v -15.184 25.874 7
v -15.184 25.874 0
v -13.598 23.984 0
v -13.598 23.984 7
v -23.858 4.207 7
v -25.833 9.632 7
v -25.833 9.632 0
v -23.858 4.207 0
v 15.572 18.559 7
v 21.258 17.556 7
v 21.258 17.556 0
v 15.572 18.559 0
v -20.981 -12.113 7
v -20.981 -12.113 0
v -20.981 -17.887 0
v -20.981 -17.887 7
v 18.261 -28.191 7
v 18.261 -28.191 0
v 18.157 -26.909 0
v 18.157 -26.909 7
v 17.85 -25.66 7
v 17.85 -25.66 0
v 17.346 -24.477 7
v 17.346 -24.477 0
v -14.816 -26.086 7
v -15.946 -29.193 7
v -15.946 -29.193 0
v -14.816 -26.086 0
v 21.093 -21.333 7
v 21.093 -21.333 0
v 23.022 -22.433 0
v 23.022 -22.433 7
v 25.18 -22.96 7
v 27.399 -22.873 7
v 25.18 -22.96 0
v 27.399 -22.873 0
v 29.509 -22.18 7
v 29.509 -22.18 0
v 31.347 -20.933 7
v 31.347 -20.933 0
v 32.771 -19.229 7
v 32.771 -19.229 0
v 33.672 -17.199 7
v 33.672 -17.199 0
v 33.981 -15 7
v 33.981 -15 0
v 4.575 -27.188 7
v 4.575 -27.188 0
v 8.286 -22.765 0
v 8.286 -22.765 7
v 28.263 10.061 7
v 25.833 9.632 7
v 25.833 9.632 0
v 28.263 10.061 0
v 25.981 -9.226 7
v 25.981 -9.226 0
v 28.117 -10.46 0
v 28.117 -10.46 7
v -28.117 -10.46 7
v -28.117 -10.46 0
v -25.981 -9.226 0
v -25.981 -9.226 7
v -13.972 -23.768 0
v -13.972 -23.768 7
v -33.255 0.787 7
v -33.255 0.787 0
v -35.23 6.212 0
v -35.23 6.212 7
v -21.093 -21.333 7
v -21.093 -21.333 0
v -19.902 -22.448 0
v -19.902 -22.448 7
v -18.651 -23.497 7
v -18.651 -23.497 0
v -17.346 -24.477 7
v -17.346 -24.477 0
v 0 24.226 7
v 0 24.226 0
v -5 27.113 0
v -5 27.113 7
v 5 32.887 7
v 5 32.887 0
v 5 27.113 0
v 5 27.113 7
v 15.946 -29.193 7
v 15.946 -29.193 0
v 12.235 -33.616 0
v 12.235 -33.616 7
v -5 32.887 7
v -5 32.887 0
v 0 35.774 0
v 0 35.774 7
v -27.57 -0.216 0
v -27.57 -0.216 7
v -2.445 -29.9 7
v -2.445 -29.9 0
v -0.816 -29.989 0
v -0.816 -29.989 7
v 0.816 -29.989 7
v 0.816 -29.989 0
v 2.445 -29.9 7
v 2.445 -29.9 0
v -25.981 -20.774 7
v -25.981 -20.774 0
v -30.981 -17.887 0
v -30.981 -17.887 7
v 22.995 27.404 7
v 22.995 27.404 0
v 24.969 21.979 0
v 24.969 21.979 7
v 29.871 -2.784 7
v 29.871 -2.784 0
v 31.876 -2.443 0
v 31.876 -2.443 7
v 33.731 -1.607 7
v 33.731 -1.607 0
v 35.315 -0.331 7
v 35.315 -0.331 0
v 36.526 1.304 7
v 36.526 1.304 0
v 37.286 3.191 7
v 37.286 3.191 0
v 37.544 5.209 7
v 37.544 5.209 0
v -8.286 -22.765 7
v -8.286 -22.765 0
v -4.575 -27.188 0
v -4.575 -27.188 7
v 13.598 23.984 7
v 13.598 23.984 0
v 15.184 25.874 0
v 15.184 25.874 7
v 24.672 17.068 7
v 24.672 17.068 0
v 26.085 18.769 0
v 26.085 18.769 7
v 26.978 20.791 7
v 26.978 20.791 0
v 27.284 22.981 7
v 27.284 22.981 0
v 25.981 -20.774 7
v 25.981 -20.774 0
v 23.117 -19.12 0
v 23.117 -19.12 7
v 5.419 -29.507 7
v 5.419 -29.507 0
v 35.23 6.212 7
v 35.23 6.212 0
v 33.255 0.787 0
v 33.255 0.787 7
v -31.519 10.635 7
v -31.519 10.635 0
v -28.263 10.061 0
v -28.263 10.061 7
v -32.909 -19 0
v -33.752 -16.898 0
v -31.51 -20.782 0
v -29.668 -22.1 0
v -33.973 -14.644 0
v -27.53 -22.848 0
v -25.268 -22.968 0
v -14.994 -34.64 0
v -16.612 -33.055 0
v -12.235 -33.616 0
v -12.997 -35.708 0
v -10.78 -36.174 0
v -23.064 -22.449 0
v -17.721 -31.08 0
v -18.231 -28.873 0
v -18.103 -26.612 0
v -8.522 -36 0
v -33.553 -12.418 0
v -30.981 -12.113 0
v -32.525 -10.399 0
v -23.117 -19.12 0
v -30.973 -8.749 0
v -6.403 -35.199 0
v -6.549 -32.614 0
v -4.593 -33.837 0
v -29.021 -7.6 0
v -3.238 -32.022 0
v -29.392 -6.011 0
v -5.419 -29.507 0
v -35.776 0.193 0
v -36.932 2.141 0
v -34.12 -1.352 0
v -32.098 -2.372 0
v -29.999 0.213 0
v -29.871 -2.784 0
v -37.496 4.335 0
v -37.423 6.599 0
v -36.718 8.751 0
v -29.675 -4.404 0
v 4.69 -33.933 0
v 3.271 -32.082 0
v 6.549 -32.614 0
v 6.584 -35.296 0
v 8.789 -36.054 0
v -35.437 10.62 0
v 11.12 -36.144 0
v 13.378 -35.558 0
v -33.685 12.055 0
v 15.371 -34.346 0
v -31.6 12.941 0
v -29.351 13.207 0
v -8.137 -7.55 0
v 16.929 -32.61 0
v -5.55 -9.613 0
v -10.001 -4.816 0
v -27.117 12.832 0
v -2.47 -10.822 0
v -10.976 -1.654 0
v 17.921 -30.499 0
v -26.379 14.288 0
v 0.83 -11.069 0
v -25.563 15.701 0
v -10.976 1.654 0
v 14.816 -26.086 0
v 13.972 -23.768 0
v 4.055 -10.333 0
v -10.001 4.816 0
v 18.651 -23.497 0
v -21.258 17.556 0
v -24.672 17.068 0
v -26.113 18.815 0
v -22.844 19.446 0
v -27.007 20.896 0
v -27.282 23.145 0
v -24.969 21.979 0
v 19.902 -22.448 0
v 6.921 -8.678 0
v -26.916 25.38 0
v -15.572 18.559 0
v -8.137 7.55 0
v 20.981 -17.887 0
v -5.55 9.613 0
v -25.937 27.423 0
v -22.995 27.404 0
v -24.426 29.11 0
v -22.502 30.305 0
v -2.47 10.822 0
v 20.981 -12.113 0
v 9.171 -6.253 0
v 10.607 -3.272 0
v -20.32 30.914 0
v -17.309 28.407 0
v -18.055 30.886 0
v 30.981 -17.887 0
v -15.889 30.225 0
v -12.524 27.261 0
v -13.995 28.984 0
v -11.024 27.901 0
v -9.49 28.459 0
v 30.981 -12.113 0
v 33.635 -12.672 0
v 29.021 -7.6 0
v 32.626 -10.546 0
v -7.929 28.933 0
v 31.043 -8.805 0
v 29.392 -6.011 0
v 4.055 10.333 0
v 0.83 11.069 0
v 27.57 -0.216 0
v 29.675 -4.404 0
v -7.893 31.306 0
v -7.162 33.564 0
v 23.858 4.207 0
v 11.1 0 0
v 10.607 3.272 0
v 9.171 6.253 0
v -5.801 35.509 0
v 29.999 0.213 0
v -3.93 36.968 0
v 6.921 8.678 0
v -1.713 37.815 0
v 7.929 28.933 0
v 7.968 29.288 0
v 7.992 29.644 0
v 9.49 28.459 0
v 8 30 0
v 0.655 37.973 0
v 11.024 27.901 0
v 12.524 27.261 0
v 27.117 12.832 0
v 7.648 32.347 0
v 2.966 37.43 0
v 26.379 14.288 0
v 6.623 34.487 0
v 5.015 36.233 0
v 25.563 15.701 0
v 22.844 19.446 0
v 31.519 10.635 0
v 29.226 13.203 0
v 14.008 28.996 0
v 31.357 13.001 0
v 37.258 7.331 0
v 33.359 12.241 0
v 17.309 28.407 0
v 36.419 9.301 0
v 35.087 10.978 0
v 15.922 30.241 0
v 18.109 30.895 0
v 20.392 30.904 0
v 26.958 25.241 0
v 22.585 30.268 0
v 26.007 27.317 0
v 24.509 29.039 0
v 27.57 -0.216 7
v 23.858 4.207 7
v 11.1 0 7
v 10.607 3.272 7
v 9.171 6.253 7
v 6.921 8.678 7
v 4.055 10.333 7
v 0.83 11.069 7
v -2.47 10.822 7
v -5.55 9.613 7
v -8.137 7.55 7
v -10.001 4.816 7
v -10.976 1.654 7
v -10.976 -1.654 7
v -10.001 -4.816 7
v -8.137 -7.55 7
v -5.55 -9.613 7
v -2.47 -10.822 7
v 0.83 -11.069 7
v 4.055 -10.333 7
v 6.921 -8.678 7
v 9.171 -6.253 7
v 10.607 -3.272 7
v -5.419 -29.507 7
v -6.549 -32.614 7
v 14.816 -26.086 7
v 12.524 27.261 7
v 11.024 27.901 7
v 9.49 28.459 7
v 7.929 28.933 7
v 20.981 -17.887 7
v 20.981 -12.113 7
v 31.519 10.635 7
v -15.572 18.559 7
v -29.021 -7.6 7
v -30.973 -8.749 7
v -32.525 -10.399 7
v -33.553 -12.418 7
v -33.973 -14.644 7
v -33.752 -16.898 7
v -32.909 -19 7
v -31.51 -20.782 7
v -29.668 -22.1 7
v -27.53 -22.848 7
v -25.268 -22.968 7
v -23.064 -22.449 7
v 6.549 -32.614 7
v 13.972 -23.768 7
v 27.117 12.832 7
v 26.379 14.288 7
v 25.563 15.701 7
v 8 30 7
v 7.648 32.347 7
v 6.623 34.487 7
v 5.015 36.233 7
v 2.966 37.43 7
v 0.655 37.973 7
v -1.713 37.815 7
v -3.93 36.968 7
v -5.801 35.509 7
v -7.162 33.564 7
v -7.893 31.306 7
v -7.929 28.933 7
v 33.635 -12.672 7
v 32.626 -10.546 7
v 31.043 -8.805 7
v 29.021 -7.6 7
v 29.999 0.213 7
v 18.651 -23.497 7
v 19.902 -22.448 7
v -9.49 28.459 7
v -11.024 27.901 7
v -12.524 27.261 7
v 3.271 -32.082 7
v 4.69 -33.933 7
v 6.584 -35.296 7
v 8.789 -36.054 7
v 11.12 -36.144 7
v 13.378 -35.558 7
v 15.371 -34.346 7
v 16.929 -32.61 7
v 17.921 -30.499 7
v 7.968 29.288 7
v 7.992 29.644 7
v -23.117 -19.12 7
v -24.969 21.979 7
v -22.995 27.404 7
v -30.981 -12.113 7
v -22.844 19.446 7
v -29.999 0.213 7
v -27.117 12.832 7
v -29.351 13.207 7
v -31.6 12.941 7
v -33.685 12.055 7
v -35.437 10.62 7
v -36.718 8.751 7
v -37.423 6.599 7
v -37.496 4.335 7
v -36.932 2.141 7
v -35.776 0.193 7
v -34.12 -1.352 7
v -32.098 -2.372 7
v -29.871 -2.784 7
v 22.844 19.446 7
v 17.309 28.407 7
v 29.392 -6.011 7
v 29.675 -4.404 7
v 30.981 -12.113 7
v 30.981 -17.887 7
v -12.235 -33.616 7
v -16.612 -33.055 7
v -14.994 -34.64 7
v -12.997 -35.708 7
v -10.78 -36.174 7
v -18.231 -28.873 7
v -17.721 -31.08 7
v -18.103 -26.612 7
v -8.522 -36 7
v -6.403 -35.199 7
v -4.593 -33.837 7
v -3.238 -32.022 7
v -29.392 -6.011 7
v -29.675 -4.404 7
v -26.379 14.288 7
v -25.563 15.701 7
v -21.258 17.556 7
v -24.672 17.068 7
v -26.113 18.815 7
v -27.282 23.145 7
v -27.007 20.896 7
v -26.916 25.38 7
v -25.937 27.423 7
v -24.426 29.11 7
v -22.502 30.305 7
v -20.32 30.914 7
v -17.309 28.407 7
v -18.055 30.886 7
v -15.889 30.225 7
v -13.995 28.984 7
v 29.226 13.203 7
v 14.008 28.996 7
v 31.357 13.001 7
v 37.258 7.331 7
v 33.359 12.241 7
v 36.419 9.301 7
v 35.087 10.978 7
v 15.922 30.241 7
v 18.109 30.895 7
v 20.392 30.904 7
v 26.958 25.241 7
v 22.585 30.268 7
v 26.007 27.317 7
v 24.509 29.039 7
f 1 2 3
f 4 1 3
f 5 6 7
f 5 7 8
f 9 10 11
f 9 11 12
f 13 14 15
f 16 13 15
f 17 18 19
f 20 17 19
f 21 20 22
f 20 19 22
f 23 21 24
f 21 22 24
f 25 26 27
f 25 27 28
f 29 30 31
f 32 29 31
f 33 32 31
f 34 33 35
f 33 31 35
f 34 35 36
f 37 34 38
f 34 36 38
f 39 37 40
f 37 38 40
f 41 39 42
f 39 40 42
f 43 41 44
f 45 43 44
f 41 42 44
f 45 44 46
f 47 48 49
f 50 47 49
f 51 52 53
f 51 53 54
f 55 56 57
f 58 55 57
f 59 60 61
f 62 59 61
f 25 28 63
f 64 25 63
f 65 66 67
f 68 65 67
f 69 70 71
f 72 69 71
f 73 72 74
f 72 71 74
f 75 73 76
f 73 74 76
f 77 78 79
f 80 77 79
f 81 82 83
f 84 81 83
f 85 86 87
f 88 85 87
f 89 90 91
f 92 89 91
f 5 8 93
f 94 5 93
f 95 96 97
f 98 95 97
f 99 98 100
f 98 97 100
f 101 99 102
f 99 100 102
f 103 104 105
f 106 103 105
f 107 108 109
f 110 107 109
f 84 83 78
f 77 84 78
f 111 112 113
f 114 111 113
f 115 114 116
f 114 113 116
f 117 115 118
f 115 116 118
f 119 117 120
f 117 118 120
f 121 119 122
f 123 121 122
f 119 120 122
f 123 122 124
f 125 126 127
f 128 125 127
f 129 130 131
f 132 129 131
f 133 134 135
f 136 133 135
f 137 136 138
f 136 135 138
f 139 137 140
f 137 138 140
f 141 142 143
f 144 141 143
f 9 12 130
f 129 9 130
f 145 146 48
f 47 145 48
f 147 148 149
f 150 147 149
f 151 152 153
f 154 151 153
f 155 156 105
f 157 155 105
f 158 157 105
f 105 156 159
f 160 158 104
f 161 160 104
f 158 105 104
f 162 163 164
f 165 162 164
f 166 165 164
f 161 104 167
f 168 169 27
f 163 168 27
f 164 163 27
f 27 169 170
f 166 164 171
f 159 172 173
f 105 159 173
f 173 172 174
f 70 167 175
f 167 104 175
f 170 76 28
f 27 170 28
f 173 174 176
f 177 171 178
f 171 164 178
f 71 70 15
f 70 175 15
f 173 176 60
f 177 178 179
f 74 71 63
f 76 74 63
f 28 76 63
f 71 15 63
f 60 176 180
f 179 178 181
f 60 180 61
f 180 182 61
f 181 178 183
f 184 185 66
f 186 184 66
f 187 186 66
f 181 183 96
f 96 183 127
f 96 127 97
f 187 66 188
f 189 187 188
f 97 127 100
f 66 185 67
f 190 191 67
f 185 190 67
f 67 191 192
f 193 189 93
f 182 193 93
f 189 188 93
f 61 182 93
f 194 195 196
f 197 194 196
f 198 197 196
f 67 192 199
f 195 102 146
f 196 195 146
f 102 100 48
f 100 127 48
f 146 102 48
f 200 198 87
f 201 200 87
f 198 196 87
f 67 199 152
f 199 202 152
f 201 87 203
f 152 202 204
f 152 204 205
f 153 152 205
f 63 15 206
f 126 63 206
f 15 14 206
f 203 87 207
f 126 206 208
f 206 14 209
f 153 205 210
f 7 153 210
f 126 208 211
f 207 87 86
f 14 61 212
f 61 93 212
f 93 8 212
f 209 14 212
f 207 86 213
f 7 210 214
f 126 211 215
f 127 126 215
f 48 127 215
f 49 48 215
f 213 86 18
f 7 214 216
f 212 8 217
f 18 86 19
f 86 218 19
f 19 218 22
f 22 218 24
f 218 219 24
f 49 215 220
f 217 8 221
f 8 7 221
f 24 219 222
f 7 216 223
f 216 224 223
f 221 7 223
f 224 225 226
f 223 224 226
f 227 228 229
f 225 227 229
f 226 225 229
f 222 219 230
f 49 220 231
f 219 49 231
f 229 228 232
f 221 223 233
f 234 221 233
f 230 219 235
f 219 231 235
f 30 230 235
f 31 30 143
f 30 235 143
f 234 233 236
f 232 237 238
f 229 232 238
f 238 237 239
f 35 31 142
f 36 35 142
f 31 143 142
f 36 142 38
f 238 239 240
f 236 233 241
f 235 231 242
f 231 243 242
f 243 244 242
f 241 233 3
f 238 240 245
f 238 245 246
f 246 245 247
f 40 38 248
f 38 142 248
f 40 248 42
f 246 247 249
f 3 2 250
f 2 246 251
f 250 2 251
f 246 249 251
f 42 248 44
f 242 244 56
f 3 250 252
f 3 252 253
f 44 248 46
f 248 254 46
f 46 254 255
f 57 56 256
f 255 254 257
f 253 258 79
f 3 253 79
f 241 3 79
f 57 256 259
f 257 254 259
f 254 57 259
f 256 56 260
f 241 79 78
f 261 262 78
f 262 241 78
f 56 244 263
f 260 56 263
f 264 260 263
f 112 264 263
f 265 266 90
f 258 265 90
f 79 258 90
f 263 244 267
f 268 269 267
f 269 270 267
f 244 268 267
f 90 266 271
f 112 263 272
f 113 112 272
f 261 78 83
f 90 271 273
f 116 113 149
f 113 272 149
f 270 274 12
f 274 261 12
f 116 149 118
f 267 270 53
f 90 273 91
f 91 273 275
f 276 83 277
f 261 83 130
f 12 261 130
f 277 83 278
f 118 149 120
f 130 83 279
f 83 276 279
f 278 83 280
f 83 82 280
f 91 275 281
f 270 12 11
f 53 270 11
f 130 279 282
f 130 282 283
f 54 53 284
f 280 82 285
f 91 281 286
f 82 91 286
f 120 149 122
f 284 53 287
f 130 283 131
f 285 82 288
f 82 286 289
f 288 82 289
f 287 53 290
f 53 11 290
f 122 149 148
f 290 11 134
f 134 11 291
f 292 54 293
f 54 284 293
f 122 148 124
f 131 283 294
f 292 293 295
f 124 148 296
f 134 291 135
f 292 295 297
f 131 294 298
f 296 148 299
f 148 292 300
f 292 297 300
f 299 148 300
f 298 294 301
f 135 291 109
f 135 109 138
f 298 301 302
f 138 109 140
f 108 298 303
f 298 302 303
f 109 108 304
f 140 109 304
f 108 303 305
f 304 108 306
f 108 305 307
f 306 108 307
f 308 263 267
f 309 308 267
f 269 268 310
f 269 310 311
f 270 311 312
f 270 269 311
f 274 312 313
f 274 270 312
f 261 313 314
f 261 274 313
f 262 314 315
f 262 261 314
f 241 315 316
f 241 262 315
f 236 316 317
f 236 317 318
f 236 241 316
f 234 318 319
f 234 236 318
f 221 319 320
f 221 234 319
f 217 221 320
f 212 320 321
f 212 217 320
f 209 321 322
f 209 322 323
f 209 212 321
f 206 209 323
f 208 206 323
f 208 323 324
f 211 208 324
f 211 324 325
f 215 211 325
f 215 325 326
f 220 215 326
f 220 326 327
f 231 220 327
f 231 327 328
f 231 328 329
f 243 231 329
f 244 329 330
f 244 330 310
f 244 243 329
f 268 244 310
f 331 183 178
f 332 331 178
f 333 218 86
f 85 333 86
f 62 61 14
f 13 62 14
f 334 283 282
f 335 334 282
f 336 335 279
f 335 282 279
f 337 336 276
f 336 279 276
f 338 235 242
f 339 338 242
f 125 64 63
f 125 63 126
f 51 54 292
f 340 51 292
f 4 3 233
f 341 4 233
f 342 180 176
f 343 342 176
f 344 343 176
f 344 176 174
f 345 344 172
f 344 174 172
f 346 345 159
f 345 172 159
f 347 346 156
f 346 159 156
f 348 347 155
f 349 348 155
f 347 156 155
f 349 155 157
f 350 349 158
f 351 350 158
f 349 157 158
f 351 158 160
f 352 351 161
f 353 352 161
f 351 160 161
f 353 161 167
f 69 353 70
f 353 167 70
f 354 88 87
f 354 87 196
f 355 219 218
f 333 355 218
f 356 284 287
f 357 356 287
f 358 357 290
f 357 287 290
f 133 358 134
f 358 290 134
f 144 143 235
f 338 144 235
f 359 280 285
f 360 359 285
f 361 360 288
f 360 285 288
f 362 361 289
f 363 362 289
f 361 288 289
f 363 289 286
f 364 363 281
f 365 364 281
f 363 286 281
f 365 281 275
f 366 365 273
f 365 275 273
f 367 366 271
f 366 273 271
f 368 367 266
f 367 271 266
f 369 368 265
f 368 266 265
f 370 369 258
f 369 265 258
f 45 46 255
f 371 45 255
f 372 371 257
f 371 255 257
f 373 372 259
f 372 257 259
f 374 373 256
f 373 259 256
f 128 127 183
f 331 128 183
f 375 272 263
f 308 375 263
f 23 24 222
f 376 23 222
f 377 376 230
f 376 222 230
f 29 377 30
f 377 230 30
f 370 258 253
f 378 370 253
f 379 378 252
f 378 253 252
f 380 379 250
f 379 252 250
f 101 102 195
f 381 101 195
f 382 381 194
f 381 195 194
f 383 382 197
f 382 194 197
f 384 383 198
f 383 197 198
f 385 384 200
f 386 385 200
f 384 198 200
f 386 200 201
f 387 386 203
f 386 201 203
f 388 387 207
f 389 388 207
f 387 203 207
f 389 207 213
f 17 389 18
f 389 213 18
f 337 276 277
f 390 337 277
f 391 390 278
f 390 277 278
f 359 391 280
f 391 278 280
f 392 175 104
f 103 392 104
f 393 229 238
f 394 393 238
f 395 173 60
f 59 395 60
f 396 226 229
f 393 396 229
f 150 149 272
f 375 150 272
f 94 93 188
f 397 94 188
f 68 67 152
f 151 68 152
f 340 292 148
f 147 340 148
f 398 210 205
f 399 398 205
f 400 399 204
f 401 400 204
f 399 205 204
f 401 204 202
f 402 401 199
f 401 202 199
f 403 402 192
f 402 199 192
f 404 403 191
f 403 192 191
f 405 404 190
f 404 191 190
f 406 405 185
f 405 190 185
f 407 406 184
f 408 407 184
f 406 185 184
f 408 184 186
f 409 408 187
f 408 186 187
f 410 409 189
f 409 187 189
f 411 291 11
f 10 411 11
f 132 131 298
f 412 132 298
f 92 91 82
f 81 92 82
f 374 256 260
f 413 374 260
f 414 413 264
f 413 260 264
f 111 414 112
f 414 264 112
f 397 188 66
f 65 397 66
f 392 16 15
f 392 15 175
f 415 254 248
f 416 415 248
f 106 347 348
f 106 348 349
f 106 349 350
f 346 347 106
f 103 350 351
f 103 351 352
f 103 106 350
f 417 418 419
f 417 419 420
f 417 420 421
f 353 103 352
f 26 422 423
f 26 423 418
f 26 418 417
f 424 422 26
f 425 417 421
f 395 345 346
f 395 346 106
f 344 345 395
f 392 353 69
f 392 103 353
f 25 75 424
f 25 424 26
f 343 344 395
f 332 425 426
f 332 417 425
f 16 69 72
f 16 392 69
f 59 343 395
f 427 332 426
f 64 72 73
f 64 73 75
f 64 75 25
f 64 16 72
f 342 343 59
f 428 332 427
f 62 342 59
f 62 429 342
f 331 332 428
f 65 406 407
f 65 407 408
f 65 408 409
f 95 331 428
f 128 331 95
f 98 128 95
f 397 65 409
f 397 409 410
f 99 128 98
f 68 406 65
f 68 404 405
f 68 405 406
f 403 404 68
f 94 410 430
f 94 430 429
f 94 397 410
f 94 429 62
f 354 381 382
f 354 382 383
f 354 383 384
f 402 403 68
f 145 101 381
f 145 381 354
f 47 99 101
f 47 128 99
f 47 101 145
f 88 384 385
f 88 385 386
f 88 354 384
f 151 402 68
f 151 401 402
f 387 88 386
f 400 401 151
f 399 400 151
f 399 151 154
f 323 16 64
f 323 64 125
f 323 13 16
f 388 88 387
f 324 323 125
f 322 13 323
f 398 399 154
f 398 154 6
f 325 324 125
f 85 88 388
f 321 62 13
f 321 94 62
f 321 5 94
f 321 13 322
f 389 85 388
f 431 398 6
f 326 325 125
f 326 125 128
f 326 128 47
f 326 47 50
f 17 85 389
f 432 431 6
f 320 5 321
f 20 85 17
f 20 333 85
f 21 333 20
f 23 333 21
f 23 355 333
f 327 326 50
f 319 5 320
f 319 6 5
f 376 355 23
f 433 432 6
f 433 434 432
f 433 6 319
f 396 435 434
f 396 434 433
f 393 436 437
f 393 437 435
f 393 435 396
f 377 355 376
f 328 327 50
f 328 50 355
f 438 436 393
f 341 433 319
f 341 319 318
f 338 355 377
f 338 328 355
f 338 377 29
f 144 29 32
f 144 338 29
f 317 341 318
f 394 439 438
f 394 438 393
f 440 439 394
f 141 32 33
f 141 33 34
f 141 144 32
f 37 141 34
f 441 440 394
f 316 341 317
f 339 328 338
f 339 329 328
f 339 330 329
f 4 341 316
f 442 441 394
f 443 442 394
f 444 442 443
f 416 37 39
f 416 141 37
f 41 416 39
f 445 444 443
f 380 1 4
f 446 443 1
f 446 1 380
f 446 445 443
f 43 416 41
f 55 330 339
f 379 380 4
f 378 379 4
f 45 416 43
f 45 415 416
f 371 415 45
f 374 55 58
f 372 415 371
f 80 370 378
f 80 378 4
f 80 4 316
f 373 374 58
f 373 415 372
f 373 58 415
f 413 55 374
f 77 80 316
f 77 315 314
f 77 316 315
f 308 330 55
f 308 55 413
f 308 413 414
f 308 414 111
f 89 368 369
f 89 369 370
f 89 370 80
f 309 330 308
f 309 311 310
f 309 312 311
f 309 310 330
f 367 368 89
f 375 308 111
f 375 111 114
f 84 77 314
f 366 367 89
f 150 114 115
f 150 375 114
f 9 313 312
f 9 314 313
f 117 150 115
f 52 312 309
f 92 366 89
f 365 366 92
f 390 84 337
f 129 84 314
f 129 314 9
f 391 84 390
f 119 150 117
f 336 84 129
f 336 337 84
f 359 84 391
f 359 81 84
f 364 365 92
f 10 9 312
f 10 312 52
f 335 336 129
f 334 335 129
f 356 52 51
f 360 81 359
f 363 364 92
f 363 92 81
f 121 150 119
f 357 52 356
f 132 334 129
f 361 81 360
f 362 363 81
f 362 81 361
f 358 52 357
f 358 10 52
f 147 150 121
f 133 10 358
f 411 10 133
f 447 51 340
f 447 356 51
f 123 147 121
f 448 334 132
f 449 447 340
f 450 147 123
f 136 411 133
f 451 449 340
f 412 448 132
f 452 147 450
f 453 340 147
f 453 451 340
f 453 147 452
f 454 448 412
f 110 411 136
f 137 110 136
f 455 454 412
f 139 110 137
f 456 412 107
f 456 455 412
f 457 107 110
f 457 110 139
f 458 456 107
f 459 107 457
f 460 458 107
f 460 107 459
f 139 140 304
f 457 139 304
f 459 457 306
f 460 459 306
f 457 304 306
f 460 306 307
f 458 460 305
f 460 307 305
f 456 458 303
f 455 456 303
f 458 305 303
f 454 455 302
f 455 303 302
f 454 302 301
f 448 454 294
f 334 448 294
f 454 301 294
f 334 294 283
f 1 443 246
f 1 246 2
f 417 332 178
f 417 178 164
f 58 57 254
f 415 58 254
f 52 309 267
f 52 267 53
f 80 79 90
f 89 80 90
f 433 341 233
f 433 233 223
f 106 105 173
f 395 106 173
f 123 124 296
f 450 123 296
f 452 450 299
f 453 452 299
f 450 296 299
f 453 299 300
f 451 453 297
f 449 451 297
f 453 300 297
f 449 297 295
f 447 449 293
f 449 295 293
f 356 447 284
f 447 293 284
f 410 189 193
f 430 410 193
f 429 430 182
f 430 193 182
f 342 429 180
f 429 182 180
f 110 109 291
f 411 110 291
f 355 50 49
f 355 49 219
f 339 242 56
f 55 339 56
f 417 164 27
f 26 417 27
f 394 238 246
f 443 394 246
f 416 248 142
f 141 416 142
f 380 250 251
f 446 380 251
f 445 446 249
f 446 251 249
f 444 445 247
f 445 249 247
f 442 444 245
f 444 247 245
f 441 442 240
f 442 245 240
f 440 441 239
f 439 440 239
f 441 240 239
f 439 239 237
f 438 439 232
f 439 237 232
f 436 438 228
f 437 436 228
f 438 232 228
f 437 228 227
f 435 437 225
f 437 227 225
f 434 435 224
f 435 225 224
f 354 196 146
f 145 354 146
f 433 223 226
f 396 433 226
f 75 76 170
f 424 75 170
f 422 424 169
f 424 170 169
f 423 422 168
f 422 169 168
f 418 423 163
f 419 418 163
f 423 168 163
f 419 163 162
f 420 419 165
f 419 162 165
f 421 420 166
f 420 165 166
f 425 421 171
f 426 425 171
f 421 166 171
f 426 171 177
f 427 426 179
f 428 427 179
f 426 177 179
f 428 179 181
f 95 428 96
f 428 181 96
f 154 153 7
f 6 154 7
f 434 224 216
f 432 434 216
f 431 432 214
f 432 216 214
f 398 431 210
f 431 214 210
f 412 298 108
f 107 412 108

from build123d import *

# Parameters (mm, degrees)
F0_R     = 11.1
F1_DEPTH = 7


with BuildPart() as f1:
    # F0 (on Top) → F1 (new body)
    with BuildSketch(Plane.XY):
        with BuildLine():
            ThreePointArc((26.4810619211, 12.5997758673), (26.7965639879, 12.722787945), (27.1169892554, 12.8323378121))
            ThreePointArc((27.1169892554, 12.8323378121), (25.9807621135, 15), (24.6716251629, 17.0678326633))
            ThreePointArc((24.6716251629, 17.0678326633), (24.4165395613, 16.8451111751), (24.1522569436, 16.6333844092))
            ThreePointArc((24.1522569436, 16.6333844092), (23.8477512735, 13.7685056173), (26.4810619211, 12.5997758673))
        make_face()
        with BuildLine():
            ThreePointArc((37.5442325904, 5.20944533), (34.2655699708, 11.6676938031), (27.1169892554, 12.8323378121))
            ThreePointArc((27.1169892554, 12.8323378121), (27.7245361912, 11.4608068208), (28.2627653008, 10.0606211314))
            Line((28.2627653008, 10.0606211314), (31.5188868085, 10.6347632057))
            Line((31.5188868085, 10.6347632057), (35.2300228034, 6.2120035512))
            Line((35.2300228034, 6.2120035512), (33.2553685852, 0.7866856755))
            Line((33.2553685852, 0.7866856755), (29.9992470775, 0.2125436013))
            ThreePointArc((29.9992470775, 0.2125436013), (29.9998117688, 0.1062724674), (30, 0))
            ThreePointArc((30, 0), (29.9676207061, -1.3934522655), (29.8705527189, -2.7838965977))
            ThreePointArc((29.8705527189, -2.7838965977), (35.3153053255, -0.3308362049), (37.5442325904, 5.20944533))
        make_face()
        with BuildLine():
            ThreePointArc((26.4810619211, 12.5997758673), (26.8071092732, 12.6939524656), (27.1169892554, 12.8323378121))
            ThreePointArc((27.1169892554, 12.8323378121), (26.7965639879, 12.722787945), (26.4810619211, 12.5997758673))
        make_face()
        with BuildLine():
            ThreePointArc((28.2627653008, 10.0606211314), (27.7245361912, 11.4608068208), (27.1169892554, 12.8323378121))
            ThreePointArc((27.1169892554, 12.8323378121), (26.8071092732, 12.6939524656), (26.4810619211, 12.5997758673))
            ThreePointArc((26.4810619211, 12.5997758673), (21.6657705663, 3.8202599087), (29.1934356258, -2.7828598124))
            ThreePointArc((29.1934356258, -2.7828598124), (29.5320302103, -2.7598421048), (29.8705527189, -2.7838965977))
            ThreePointArc((29.8705527189, -2.7838965977), (29.9676207061, -1.3934522655), (30, 0))
            ThreePointArc((30, 0), (29.9998117688, 0.1062724674), (29.9992470775, 0.2125436013))
            Line((29.9992470775, 0.2125436013), (27.5695783722, -0.2158725457))
            Line((27.5695783722, -0.2158725457), (23.8584423773, 4.2068871088))
            Line((23.8584423773, 4.2068871088), (25.8330965955, 9.6322049845))
            Line((25.8330965955, 9.6322049845), (28.2627653008, 10.0606211314))
        make_face()
        with BuildLine():
            ThreePointArc((24.1522569436, 16.6333844092), (24.3968399462, 16.8686613998), (24.6716251629, 17.0678326633))
            ThreePointArc((24.6716251629, 17.0678326633), (23.7876179503, 18.2797492393), (22.8441361281, 19.445962166))
            Line((22.8441361281, 19.445962166), (21.2582825088, 17.5560154179))
            Line((21.2582825088, 17.5560154179), (15.5724922958, 18.5585736391))
            Line((15.5724922958, 18.5585736391), (13.5978380776, 23.9838915148))
            Line((13.5978380776, 23.9838915148), (15.1836916969, 25.8738382629))
            ThreePointArc((15.1836916969, 25.8738382629), (13.8713622659, 26.6004757267), (12.5243511843, 27.2606057785))
            ThreePointArc((12.5243511843, 27.2606057785), (12.375921732, 26.9554094398), (12.1866905202, 26.6736867819))
            ThreePointArc((12.1866905202, 26.6736867819), (14.1413274131, 16.8529777486), (24.1522569436, 16.6333844092))
        make_face()
        with BuildLine():
            ThreePointArc((22.8441361281, 19.445962166), (23.7876179503, 18.2797492393), (24.6716251629, 17.0678326633))
            ThreePointArc((24.6716251629, 17.0678326633), (26.6015506384, 19.7489947422), (27.2836282906, 22.9813332936))
            ThreePointArc((27.2836282906, 22.9813332936), (21.5113831189, 30.6648942145), (12.5243511843, 27.2606057785))
            ThreePointArc((12.5243511843, 27.2606057785), (13.8713622659, 26.6004757267), (15.1836916969, 25.8738382629))
            Line((15.1836916969, 25.8738382629), (17.3089740724, 28.4066511692))
            Line((17.3089740724, 28.4066511692), (22.9947642854, 27.404092948))
            Line((22.9947642854, 27.404092948), (24.9694185036, 21.9787750724))
            Line((24.9694185036, 21.9787750724), (22.8441361281, 19.445962166))
        make_face()
        with BuildLine():
            ThreePointArc((24.1522569436, 16.6333844092), (24.4165395613, 16.8451111751), (24.6716251629, 17.0678326633))
            ThreePointArc((24.6716251629, 17.0678326633), (24.3968399462, 16.8686613998), (24.1522569436, 16.6333844092))
        make_face()
        with BuildLine():
            ThreePointArc((29.0212866821, -7.6003236322), (29.5442325904, -5.20944533), (29.8705527189, -2.7838965977))
            ThreePointArc((29.8705527189, -2.7838965977), (29.5319831983, -2.790545292), (29.1934356258, -2.7828598124))
            ThreePointArc((29.1934356258, -2.7828598124), (27.1186621586, -4.7817518193), (28.3846501448, -7.3697102065))
            ThreePointArc((28.3846501448, -7.3697102065), (28.7054093893, -7.4782783073), (29.0212866821, -7.6003236322))
        make_face()
        with BuildLine():
            ThreePointArc((29.1934356258, -2.7828598124), (29.5319831983, -2.790545292), (29.8705527189, -2.7838965977))
            ThreePointArc((29.8705527189, -2.7838965977), (29.5320302103, -2.7598421048), (29.1934356258, -2.7828598124))
        make_face()
        with BuildLine():
            ThreePointArc((12.1866905202, 26.6736867819), (12.3493084858, 26.9707203199), (12.5243511843, 27.2606057785))
            ThreePointArc((12.5243511843, 27.2606057785), (10.2606042998, 28.1907786236), (7.9285699986, 28.9333333333))
            ThreePointArc((7.9285699986, 28.9333333333), (7.876325704, 28.5987529108), (7.8099688151, 28.2666832062))
            ThreePointArc((7.8099688151, 28.2666832062), (9.4182125292, 25.8763262557), (12.1866905202, 26.6736867819))
        make_face()
        with BuildLine():
            ThreePointArc((12.1866905202, 26.6736867819), (12.375921732, 26.9554094398), (12.5243511843, 27.2606057785))
            ThreePointArc((12.5243511843, 27.2606057785), (12.3493084858, 26.9707203199), (12.1866905202, 26.6736867819))
        make_face()
        with BuildLine():
            ThreePointArc((33.9807621135, -15), (32.6262190786, -10.5460240542), (29.0212866821, -7.6003236322))
            ThreePointArc((29.0212866821, -7.6003236322), (28.6050915087, -9.0415009693), (28.1173769149, -10.4600724388))
            Line((28.1173769149, -10.4600724388), (30.9807621135, -12.1132486541))
            Line((30.9807621135, -12.1132486541), (30.9807621135, -17.8867513459))
            Line((30.9807621135, -17.8867513459), (25.9807621135, -20.7735026919))
            Line((25.9807621135, -20.7735026919), (23.1173769149, -19.1203264767))
            ThreePointArc((23.1173769149, -19.1203264767), (22.1327152821, -20.2519854395), (21.0927166835, -21.3330097011))
            ThreePointArc((21.0927166835, -21.3330097011), (29.5089086921, -22.1799847994), (33.9807621135, -15))
        make_face()
        with BuildLine():
            ThreePointArc((28.3846501448, -7.3697102065), (28.6949524576, -7.5071459448), (29.0212866821, -7.6003236322))
            ThreePointArc((29.0212866821, -7.6003236322), (28.7054093893, -7.4782783073), (28.3846501448, -7.3697102065))
        make_face()
        with BuildLine():
            ThreePointArc((28.1173769149, -10.4600724388), (28.6050915087, -9.0415009693), (29.0212866821, -7.6003236322))
            ThreePointArc((29.0212866821, -7.6003236322), (28.6949524576, -7.5071459448), (28.3846501448, -7.3697102065))
            ThreePointArc((28.3846501448, -7.3697102065), (19.0525588833, -11), (20.5746813298, -20.8969729997))
            ThreePointArc((20.5746813298, -20.8969729997), (20.848855327, -21.0969848163), (21.0927166835, -21.3330097011))
            ThreePointArc((21.0927166835, -21.3330097011), (22.1327152821, -20.2519854395), (23.1173769149, -19.1203264767))
            Line((23.1173769149, -19.1203264767), (20.9807621135, -17.8867513459))
            Line((20.9807621135, -17.8867513459), (20.9807621135, -12.1132486541))
            Line((20.9807621135, -12.1132486541), (25.9807621135, -9.2264973081))
            Line((25.9807621135, -9.2264973081), (28.1173769149, -10.4600724388))
        make_face()
        with BuildLine():
            ThreePointArc((7.8099688151, 28.2666832062), (7.8460971307, 28.6041307611), (7.9285699986, 28.9333333333))
            ThreePointArc((7.9285699986, 28.9333333333), (6.4723762266, 29.2934864088), (5, 29.5803989155))
            Line((5, 29.5803989155), (5, 27.1132486541))
            Line((5, 27.1132486541), (0, 24.2264973081))
            Line((0, 24.2264973081), (-5, 27.1132486541))
            Line((-5, 27.1132486541), (-5, 29.5803989155))
            ThreePointArc((-5, 29.5803989155), (-6.4723762266, 29.2934864088), (-7.9285699986, 28.9333333333))
            ThreePointArc((-7.9285699986, 28.9333333333), (-7.8460971307, 28.6041307611), (-7.8099688151, 28.2666832062))
            ThreePointArc((-7.8099688151, 28.2666832062), (0, 22), (7.8099688151, 28.2666832062))
        make_face()
        with BuildLine():
            ThreePointArc((5, 29.5803989155), (6.4723762266, 29.2934864088), (7.9285699986, 28.9333333333))
            ThreePointArc((7.9285699986, 28.9333333333), (7.9821225244, 29.4654721656), (8, 30))
            ThreePointArc((8, 30), (-0.5345278344, 37.9821225244), (-7.9285699986, 28.9333333333))
            ThreePointArc((-7.9285699986, 28.9333333333), (-6.4723762266, 29.2934864088), (-5, 29.5803989155))
            Line((-5, 29.5803989155), (-5, 32.8867513459))
            Line((-5, 32.8867513459), (0, 35.7735026919))
            Line((0, 35.7735026919), (5, 32.8867513459))
            Line((5, 32.8867513459), (5, 29.5803989155))
        make_face()
        with BuildLine():
            ThreePointArc((7.8099688151, 28.2666832062), (7.876325704, 28.5987529108), (7.9285699986, 28.9333333333))
            ThreePointArc((7.9285699986, 28.9333333333), (7.8460971307, 28.6041307611), (7.8099688151, 28.2666832062))
        make_face()
        with BuildLine():
            ThreePointArc((21.0927166835, -21.3330097011), (20.848855327, -21.0969848163), (20.5746813298, -20.8969729997))
            ThreePointArc((20.5746813298, -20.8969729997), (20.8290836854, -21.1204746035), (21.0927166835, -21.3330097011))
        make_face()
        with BuildLine():
            ThreePointArc((21.0927166835, -21.3330097011), (20.8290836854, -21.1204746035), (20.5746813298, -20.8969729997))
            ThreePointArc((20.5746813298, -20.8969729997), (17.7004496294, -21.0945744364), (17.0067451056, -23.8908269695))
            ThreePointArc((17.0067451056, -23.8908269695), (17.1826747124, -24.1801750278), (17.3462015346, -24.4767091808))
            ThreePointArc((17.3462015346, -24.4767091808), (19.2836282906, -22.9813332936), (21.0927166835, -21.3330097011))
        make_face()
        with BuildLine():
            ThreePointArc((-12.1866905202, 26.6736867819), (-9.4182125292, 25.8763262557), (-7.8099688151, 28.2666832062))
            ThreePointArc((-7.8099688151, 28.2666832062), (-7.876325704, 28.5987529108), (-7.9285699986, 28.9333333333))
            ThreePointArc((-7.9285699986, 28.9333333333), (-10.2606042998, 28.1907786236), (-12.5243511843, 27.2606057785))
            ThreePointArc((-12.5243511843, 27.2606057785), (-12.3493084858, 26.9707203199), (-12.1866905202, 26.6736867819))
        make_face()
        with BuildLine():
            ThreePointArc((-7.9285699986, 28.9333333333), (-7.876325704, 28.5987529108), (-7.8099688151, 28.2666832062))
            ThreePointArc((-7.8099688151, 28.2666832062), (-7.8460971307, 28.6041307611), (-7.9285699986, 28.9333333333))
        make_face()
        with BuildLine():
            ThreePointArc((17.3462015346, -24.4767091808), (17.1561084783, -24.195567335), (17.0067451056, -23.8908269695))
            ThreePointArc((17.0067451056, -23.8908269695), (7.5244431532, -20.6732376573), (2.3288049774, -29.2331602765))
            ThreePointArc((2.3288049774, -29.2331602765), (2.410269327, -29.5626138654), (2.4453640925, -29.9001704754))
            ThreePointArc((2.4453640925, -29.9001704754), (3.9369182409, -29.7405560601), (5.4186291728, -29.5065832974))
            Line((5.4186291728, -29.5065832974), (4.5748140868, -27.1882204024))
            Line((4.5748140868, -27.1882204024), (8.2859500816, -22.7654607479))
            Line((8.2859500816, -22.7654607479), (13.9717402946, -23.7680189691))
            Line((13.9717402946, -23.7680189691), (14.8155553806, -26.0863818642))
            ThreePointArc((14.8155553806, -26.0863818642), (16.1010065991, -25.3131899707), (17.3462015346, -24.4767091808))
        make_face()
        with BuildLine():
            ThreePointArc((17.3462015346, -24.4767091808), (17.1826747124, -24.1801750278), (17.0067451056, -23.8908269695))
            ThreePointArc((17.0067451056, -23.8908269695), (17.1561084783, -24.195567335), (17.3462015346, -24.4767091808))
        make_face()
        with BuildLine():
            ThreePointArc((-12.5243511843, 27.2606057785), (-12.375921732, 26.9554094398), (-12.1866905202, 26.6736867819))
            ThreePointArc((-12.1866905202, 26.6736867819), (-12.3493084858, 26.9707203199), (-12.5243511843, 27.2606057785))
        make_face()
        with BuildLine():
            ThreePointArc((-11.2836282906, 22.9813332936), (-11.5126726813, 24.881925022), (-12.1866905202, 26.6736867819))
            ThreePointArc((-12.1866905202, 26.6736867819), (-12.375921732, 26.9554094398), (-12.5243511843, 27.2606057785))
            ThreePointArc((-12.5243511843, 27.2606057785), (-13.8713622659, 26.6004757267), (-15.1836916969, 25.8738382629))
            Line((-15.1836916969, 25.8738382629), (-13.5978380776, 23.9838915148))
            Line((-13.5978380776, 23.9838915148), (-15.5724922958, 18.5585736391))
            Line((-15.5724922958, 18.5585736391), (-21.2582825088, 17.5560154179))
            Line((-21.2582825088, 17.5560154179), (-22.8441361281, 19.445962166))
            ThreePointArc((-22.8441361281, 19.445962166), (-23.7876179503, 18.2797492393), (-24.6716251629, 17.0678326633))
            ThreePointArc((-24.6716251629, 17.0678326633), (-24.3968399462, 16.8686613998), (-24.1522569436, 16.6333844092))
            ThreePointArc((-24.1522569436, 16.6333844092), (-15.7444920417, 15.8067591172), (-11.2836282906, 22.9813332936))
        make_face()
        with BuildLine():
            ThreePointArc((18.2606042998, -28.1907786236), (18.0286406629, -26.2782904378), (17.3462015346, -24.4767091808))
            ThreePointArc((17.3462015346, -24.4767091808), (16.1010065991, -25.3131899707), (14.8155553806, -26.0863818642))
            Line((14.8155553806, -26.0863818642), (15.9463945128, -29.1933368448))
            Line((15.9463945128, -29.1933368448), (12.2352585179, -33.6160964992))
            Line((12.2352585179, -33.6160964992), (6.5494683049, -32.613538278))
            Line((6.5494683049, -32.613538278), (5.4186291728, -29.5065832974))
            ThreePointArc((5.4186291728, -29.5065832974), (3.9369182409, -29.7405560601), (2.4453640925, -29.9001704754))
            ThreePointArc((2.4453640925, -29.9001704754), (11.1202781746, -36.1444545554), (18.2606042998, -28.1907786236))
        make_face()
        with BuildLine():
            ThreePointArc((2.4453640925, -29.9001704754), (2.410269327, -29.5626138654), (2.3288049774, -29.2331602765))
            ThreePointArc((2.3288049774, -29.2331602765), (2.3800244266, -29.5678991202), (2.4453640925, -29.9001704754))
        make_face()
        with BuildLine():
            ThreePointArc((2.4453640925, -29.9001704754), (2.3800244266, -29.5678991202), (2.3288049774, -29.2331602765))
            ThreePointArc((2.3288049774, -29.2331602765), (0, -27.5370112346), (-2.3288049774, -29.2331602765))
            ThreePointArc((-2.3288049774, -29.2331602765), (-2.3800244266, -29.5678991202), (-2.4453640925, -29.9001704754))
            ThreePointArc((-2.4453640925, -29.9001704754), (0, -30), (2.4453640925, -29.9001704754))
        make_face()
        with BuildLine():
            ThreePointArc((-15.1836916969, 25.8738382629), (-13.8713622659, 26.6004757267), (-12.5243511843, 27.2606057785))
            ThreePointArc((-12.5243511843, 27.2606057785), (-24.4259291681, 29.1096888385), (-24.6716251629, 17.0678326633))
            ThreePointArc((-24.6716251629, 17.0678326633), (-23.7876179503, 18.2797492393), (-22.8441361281, 19.445962166))
            Line((-22.8441361281, 19.445962166), (-24.9694185036, 21.9787750724))
            Line((-24.9694185036, 21.9787750724), (-22.9947642854, 27.404092948))
            Line((-22.9947642854, 27.404092948), (-17.3089740724, 28.4066511692))
            Line((-17.3089740724, 28.4066511692), (-15.1836916969, 25.8738382629))
        make_face()
        with BuildLine():
            ThreePointArc((-2.4453640925, -29.9001704754), (-2.410269327, -29.5626138654), (-2.3288049774, -29.2331602765))
            ThreePointArc((-2.3288049774, -29.2331602765), (-2.2776726773, -28.7130838128), (-2.2606042998, -28.1907786236))
            ThreePointArc((-2.2606042998, -28.1907786236), (-8.0210872142, -20.51063779), (-17.0067451056, -23.8908269695))
            ThreePointArc((-17.0067451056, -23.8908269695), (-17.1561084783, -24.195567335), (-17.3462015346, -24.4767091808))
            ThreePointArc((-17.3462015346, -24.4767091808), (-16.1010065991, -25.3131899707), (-14.8155553806, -26.0863818642))
            Line((-14.8155553806, -26.0863818642), (-13.9717402946, -23.7680189691))
            Line((-13.9717402946, -23.7680189691), (-8.2859500816, -22.7654607479))
            Line((-8.2859500816, -22.7654607479), (-4.5748140868, -27.1882204024))
            Line((-4.5748140868, -27.1882204024), (-5.4186291728, -29.5065832974))
            ThreePointArc((-5.4186291728, -29.5065832974), (-3.9369182409, -29.7405560601), (-2.4453640925, -29.9001704754))
        make_face()
        with BuildLine():
            ThreePointArc((-2.4453640925, -29.9001704754), (-2.3800244266, -29.5678991202), (-2.3288049774, -29.2331602765))
            ThreePointArc((-2.3288049774, -29.2331602765), (-2.410269327, -29.5626138654), (-2.4453640925, -29.9001704754))
        make_face()
        with BuildLine():
            ThreePointArc((-24.1522569436, 16.6333844092), (-24.4165395613, 16.8451111751), (-24.6716251629, 17.0678326633))
            ThreePointArc((-24.6716251629, 17.0678326633), (-25.9807621135, 15), (-27.1169892554, 12.8323378121))
            ThreePointArc((-27.1169892554, 12.8323378121), (-26.7965639879, 12.722787945), (-26.4810619211, 12.5997758673))
            ThreePointArc((-26.4810619211, 12.5997758673), (-23.8477512735, 13.7685056173), (-24.1522569436, 16.6333844092))
        make_face()
        with BuildLine():
            ThreePointArc((-24.1522569436, 16.6333844092), (-24.3968399462, 16.8686613998), (-24.6716251629, 17.0678326633))
            ThreePointArc((-24.6716251629, 17.0678326633), (-24.4165395613, 16.8451111751), (-24.1522569436, 16.6333844092))
        make_face()
        with BuildLine():
            ThreePointArc((-17.3462015346, -24.4767091808), (-12.9967654464, -35.7083195899), (-2.4453640925, -29.9001704754))
            ThreePointArc((-2.4453640925, -29.9001704754), (-3.9369182409, -29.7405560601), (-5.4186291728, -29.5065832974))
            Line((-5.4186291728, -29.5065832974), (-6.5494683049, -32.613538278))
            Line((-6.5494683049, -32.613538278), (-12.2352585179, -33.6160964992))
            Line((-12.2352585179, -33.6160964992), (-15.9463945128, -29.1933368448))
            Line((-15.9463945128, -29.1933368448), (-14.8155553806, -26.0863818642))
            ThreePointArc((-14.8155553806, -26.0863818642), (-16.1010065991, -25.3131899707), (-17.3462015346, -24.4767091808))
        make_face()
        with BuildLine():
            ThreePointArc((-26.4810619211, 12.5997758673), (-26.8071092732, 12.6939524656), (-27.1169892554, 12.8323378121))
            ThreePointArc((-27.1169892554, 12.8323378121), (-27.7245361912, 11.4608068208), (-28.2627653008, 10.0606211314))
            Line((-28.2627653008, 10.0606211314), (-25.8330965955, 9.6322049845))
            Line((-25.8330965955, 9.6322049845), (-23.8584423773, 4.2068871088))
            Line((-23.8584423773, 4.2068871088), (-27.5695783722, -0.2158725457))
            Line((-27.5695783722, -0.2158725457), (-29.9992470775, 0.2125436013))
            ThreePointArc((-29.9992470775, 0.2125436013), (-29.972368865, -1.287285756), (-29.8705527189, -2.7838965977))
            ThreePointArc((-29.8705527189, -2.7838965977), (-29.5320302103, -2.7598421048), (-29.1934356258, -2.7828598124))
            ThreePointArc((-29.1934356258, -2.7828598124), (-23.7646834853, -0.3219931937), (-21.5442325904, 5.20944533))
            ThreePointArc((-21.5442325904, 5.20944533), (-22.8919636032, 9.6532407036), (-26.4810619211, 12.5997758673))
        make_face()
        with BuildLine():
            ThreePointArc((-28.2627653008, 10.0606211314), (-27.7245361912, 11.4608068208), (-27.1169892554, 12.8323378121))
            ThreePointArc((-27.1169892554, 12.8323378121), (-37.4226946145, 6.5986307513), (-29.8705527189, -2.7838965977))
            ThreePointArc((-29.8705527189, -2.7838965977), (-29.972368865, -1.287285756), (-29.9992470775, 0.2125436013))
            Line((-29.9992470775, 0.2125436013), (-33.2553685852, 0.7866856755))
            Line((-33.2553685852, 0.7866856755), (-35.2300228034, 6.2120035512))
            Line((-35.2300228034, 6.2120035512), (-31.5188868085, 10.6347632057))
            Line((-31.5188868085, 10.6347632057), (-28.2627653008, 10.0606211314))
        make_face()
        with BuildLine():
            ThreePointArc((-26.4810619211, 12.5997758673), (-26.7965639879, 12.722787945), (-27.1169892554, 12.8323378121))
            ThreePointArc((-27.1169892554, 12.8323378121), (-26.8071092732, 12.6939524656), (-26.4810619211, 12.5997758673))
        make_face()
        with BuildLine():
            ThreePointArc((-21.0927166835, -21.3330097011), (-19.2836282906, -22.9813332936), (-17.3462015346, -24.4767091808))
            ThreePointArc((-17.3462015346, -24.4767091808), (-17.1826747124, -24.1801750278), (-17.0067451056, -23.8908269695))
            ThreePointArc((-17.0067451056, -23.8908269695), (-17.7004496294, -21.0945744364), (-20.5746813298, -20.8969729997))
            ThreePointArc((-20.5746813298, -20.8969729997), (-20.8290836854, -21.1204746035), (-21.0927166835, -21.3330097011))
        make_face()
        with BuildLine():
            ThreePointArc((-17.0067451056, -23.8908269695), (-17.1826747124, -24.1801750278), (-17.3462015346, -24.4767091808))
            ThreePointArc((-17.3462015346, -24.4767091808), (-17.1561084783, -24.195567335), (-17.0067451056, -23.8908269695))
        make_face()
        with BuildLine():
            ThreePointArc((-29.1934356258, -2.7828598124), (-29.5319831983, -2.790545292), (-29.8705527189, -2.7838965977))
            ThreePointArc((-29.8705527189, -2.7838965977), (-29.5442325904, -5.20944533), (-29.0212866821, -7.6003236322))
            ThreePointArc((-29.0212866821, -7.6003236322), (-28.7054093893, -7.4782783073), (-28.3846501448, -7.3697102065))
            ThreePointArc((-28.3846501448, -7.3697102065), (-27.1186621586, -4.7817518193), (-29.1934356258, -2.7828598124))
        make_face()
        with BuildLine():
            ThreePointArc((-29.1934356258, -2.7828598124), (-29.5320302103, -2.7598421048), (-29.8705527189, -2.7838965977))
            ThreePointArc((-29.8705527189, -2.7838965977), (-29.5319831983, -2.790545292), (-29.1934356258, -2.7828598124))
        make_face()
        with BuildLine():
            ThreePointArc((-29.0212866821, -7.6003236322), (-32.9089653438, -19), (-21.0927166835, -21.3330097011))
            ThreePointArc((-21.0927166835, -21.3330097011), (-22.1327152821, -20.2519854395), (-23.1173769149, -19.1203264767))
            Line((-23.1173769149, -19.1203264767), (-25.9807621135, -20.7735026919))
            Line((-25.9807621135, -20.7735026919), (-30.9807621135, -17.8867513459))
            Line((-30.9807621135, -17.8867513459), (-30.9807621135, -12.1132486541))
            Line((-30.9807621135, -12.1132486541), (-28.1173769149, -10.4600724388))
            ThreePointArc((-28.1173769149, -10.4600724388), (-28.6050915087, -9.0415009693), (-29.0212866821, -7.6003236322))
        make_face()
        with BuildLine():
            ThreePointArc((-20.5746813298, -20.8969729997), (-20.848855327, -21.0969848163), (-21.0927166835, -21.3330097011))
            ThreePointArc((-21.0927166835, -21.3330097011), (-20.8290836854, -21.1204746035), (-20.5746813298, -20.8969729997))
        make_face()
        with BuildLine():
            ThreePointArc((-23.1173769149, -19.1203264767), (-22.1327152821, -20.2519854395), (-21.0927166835, -21.3330097011))
            ThreePointArc((-21.0927166835, -21.3330097011), (-20.848855327, -21.0969848163), (-20.5746813298, -20.8969729997))
            ThreePointArc((-20.5746813298, -20.8969729997), (-18.6578990713, -18.2211297498), (-17.9807621135, -15))
            ThreePointArc((-17.9807621135, -15), (-21.2495415654, -8.5489882867), (-28.3846501448, -7.3697102065))
            ThreePointArc((-28.3846501448, -7.3697102065), (-28.6949524576, -7.5071459448), (-29.0212866821, -7.6003236322))
            ThreePointArc((-29.0212866821, -7.6003236322), (-28.6050915087, -9.0415009693), (-28.1173769149, -10.4600724388))
            Line((-28.1173769149, -10.4600724388), (-25.9807621135, -9.2264973081))
            Line((-25.9807621135, -9.2264973081), (-20.9807621135, -12.1132486541))
            Line((-20.9807621135, -12.1132486541), (-20.9807621135, -17.8867513459))
            Line((-20.9807621135, -17.8867513459), (-23.1173769149, -19.1203264767))
        make_face()
        with BuildLine():
            ThreePointArc((-28.3846501448, -7.3697102065), (-28.7054093893, -7.4782783073), (-29.0212866821, -7.6003236322))
            ThreePointArc((-29.0212866821, -7.6003236322), (-28.6949524576, -7.5071459448), (-28.3846501448, -7.3697102065))
        make_face()
        with BuildLine():
            ThreePointArc((29.1934356258, -2.7828598124), (21.6657705663, 3.8202599087), (26.4810619211, 12.5997758673))
            ThreePointArc((26.4810619211, 12.5997758673), (23.8477512735, 13.7685056173), (24.1522569436, 16.6333844092))
            ThreePointArc((24.1522569436, 16.6333844092), (14.1413274131, 16.8529777486), (12.1866905202, 26.6736867819))
            ThreePointArc((12.1866905202, 26.6736867819), (9.4182125292, 25.8763262557), (7.8099688151, 28.2666832062))
            ThreePointArc((7.8099688151, 28.2666832062), (0, 22), (-7.8099688151, 28.2666832062))
            ThreePointArc((-7.8099688151, 28.2666832062), (-9.4182125292, 25.8763262557), (-12.1866905202, 26.6736867819))
            ThreePointArc((-12.1866905202, 26.6736867819), (-11.5126726813, 24.881925022), (-11.2836282906, 22.9813332936))
            ThreePointArc((-11.2836282906, 22.9813332936), (-15.7444920417, 15.8067591172), (-24.1522569436, 16.6333844092))
            ThreePointArc((-24.1522569436, 16.6333844092), (-23.8477512735, 13.7685056173), (-26.4810619211, 12.5997758673))
            ThreePointArc((-26.4810619211, 12.5997758673), (-22.8919636032, 9.6532407036), (-21.5442325904, 5.20944533))
            ThreePointArc((-21.5442325904, 5.20944533), (-23.7646834853, -0.3219931937), (-29.1934356258, -2.7828598124))
            ThreePointArc((-29.1934356258, -2.7828598124), (-27.1186621586, -4.7817518193), (-28.3846501448, -7.3697102065))
            ThreePointArc((-28.3846501448, -7.3697102065), (-21.2495415654, -8.5489882867), (-17.9807621135, -15))
            ThreePointArc((-17.9807621135, -15), (-18.6578990713, -18.2211297498), (-20.5746813298, -20.8969729997))
            ThreePointArc((-20.5746813298, -20.8969729997), (-17.7004496294, -21.0945744364), (-17.0067451056, -23.8908269695))
            ThreePointArc((-17.0067451056, -23.8908269695), (-8.0210872142, -20.51063779), (-2.2606042998, -28.1907786236))
            ThreePointArc((-2.2606042998, -28.1907786236), (-2.2776726773, -28.7130838128), (-2.3288049774, -29.2331602765))
            ThreePointArc((-2.3288049774, -29.2331602765), (0, -27.5370112346), (2.3288049774, -29.2331602765))
            ThreePointArc((2.3288049774, -29.2331602765), (7.5244431532, -20.6732376573), (17.0067451056, -23.8908269695))
            ThreePointArc((17.0067451056, -23.8908269695), (17.7004496294, -21.0945744364), (20.5746813298, -20.8969729997))
            ThreePointArc((20.5746813298, -20.8969729997), (19.0525588833, -11), (28.3846501448, -7.3697102065))
            ThreePointArc((28.3846501448, -7.3697102065), (27.1186621586, -4.7817518193), (29.1934356258, -2.7828598124))
        make_face()
        Circle(F0_R, mode=Mode.SUBTRACT)
    extrude(amount=F1_DEPTH)


solid = f1.part
